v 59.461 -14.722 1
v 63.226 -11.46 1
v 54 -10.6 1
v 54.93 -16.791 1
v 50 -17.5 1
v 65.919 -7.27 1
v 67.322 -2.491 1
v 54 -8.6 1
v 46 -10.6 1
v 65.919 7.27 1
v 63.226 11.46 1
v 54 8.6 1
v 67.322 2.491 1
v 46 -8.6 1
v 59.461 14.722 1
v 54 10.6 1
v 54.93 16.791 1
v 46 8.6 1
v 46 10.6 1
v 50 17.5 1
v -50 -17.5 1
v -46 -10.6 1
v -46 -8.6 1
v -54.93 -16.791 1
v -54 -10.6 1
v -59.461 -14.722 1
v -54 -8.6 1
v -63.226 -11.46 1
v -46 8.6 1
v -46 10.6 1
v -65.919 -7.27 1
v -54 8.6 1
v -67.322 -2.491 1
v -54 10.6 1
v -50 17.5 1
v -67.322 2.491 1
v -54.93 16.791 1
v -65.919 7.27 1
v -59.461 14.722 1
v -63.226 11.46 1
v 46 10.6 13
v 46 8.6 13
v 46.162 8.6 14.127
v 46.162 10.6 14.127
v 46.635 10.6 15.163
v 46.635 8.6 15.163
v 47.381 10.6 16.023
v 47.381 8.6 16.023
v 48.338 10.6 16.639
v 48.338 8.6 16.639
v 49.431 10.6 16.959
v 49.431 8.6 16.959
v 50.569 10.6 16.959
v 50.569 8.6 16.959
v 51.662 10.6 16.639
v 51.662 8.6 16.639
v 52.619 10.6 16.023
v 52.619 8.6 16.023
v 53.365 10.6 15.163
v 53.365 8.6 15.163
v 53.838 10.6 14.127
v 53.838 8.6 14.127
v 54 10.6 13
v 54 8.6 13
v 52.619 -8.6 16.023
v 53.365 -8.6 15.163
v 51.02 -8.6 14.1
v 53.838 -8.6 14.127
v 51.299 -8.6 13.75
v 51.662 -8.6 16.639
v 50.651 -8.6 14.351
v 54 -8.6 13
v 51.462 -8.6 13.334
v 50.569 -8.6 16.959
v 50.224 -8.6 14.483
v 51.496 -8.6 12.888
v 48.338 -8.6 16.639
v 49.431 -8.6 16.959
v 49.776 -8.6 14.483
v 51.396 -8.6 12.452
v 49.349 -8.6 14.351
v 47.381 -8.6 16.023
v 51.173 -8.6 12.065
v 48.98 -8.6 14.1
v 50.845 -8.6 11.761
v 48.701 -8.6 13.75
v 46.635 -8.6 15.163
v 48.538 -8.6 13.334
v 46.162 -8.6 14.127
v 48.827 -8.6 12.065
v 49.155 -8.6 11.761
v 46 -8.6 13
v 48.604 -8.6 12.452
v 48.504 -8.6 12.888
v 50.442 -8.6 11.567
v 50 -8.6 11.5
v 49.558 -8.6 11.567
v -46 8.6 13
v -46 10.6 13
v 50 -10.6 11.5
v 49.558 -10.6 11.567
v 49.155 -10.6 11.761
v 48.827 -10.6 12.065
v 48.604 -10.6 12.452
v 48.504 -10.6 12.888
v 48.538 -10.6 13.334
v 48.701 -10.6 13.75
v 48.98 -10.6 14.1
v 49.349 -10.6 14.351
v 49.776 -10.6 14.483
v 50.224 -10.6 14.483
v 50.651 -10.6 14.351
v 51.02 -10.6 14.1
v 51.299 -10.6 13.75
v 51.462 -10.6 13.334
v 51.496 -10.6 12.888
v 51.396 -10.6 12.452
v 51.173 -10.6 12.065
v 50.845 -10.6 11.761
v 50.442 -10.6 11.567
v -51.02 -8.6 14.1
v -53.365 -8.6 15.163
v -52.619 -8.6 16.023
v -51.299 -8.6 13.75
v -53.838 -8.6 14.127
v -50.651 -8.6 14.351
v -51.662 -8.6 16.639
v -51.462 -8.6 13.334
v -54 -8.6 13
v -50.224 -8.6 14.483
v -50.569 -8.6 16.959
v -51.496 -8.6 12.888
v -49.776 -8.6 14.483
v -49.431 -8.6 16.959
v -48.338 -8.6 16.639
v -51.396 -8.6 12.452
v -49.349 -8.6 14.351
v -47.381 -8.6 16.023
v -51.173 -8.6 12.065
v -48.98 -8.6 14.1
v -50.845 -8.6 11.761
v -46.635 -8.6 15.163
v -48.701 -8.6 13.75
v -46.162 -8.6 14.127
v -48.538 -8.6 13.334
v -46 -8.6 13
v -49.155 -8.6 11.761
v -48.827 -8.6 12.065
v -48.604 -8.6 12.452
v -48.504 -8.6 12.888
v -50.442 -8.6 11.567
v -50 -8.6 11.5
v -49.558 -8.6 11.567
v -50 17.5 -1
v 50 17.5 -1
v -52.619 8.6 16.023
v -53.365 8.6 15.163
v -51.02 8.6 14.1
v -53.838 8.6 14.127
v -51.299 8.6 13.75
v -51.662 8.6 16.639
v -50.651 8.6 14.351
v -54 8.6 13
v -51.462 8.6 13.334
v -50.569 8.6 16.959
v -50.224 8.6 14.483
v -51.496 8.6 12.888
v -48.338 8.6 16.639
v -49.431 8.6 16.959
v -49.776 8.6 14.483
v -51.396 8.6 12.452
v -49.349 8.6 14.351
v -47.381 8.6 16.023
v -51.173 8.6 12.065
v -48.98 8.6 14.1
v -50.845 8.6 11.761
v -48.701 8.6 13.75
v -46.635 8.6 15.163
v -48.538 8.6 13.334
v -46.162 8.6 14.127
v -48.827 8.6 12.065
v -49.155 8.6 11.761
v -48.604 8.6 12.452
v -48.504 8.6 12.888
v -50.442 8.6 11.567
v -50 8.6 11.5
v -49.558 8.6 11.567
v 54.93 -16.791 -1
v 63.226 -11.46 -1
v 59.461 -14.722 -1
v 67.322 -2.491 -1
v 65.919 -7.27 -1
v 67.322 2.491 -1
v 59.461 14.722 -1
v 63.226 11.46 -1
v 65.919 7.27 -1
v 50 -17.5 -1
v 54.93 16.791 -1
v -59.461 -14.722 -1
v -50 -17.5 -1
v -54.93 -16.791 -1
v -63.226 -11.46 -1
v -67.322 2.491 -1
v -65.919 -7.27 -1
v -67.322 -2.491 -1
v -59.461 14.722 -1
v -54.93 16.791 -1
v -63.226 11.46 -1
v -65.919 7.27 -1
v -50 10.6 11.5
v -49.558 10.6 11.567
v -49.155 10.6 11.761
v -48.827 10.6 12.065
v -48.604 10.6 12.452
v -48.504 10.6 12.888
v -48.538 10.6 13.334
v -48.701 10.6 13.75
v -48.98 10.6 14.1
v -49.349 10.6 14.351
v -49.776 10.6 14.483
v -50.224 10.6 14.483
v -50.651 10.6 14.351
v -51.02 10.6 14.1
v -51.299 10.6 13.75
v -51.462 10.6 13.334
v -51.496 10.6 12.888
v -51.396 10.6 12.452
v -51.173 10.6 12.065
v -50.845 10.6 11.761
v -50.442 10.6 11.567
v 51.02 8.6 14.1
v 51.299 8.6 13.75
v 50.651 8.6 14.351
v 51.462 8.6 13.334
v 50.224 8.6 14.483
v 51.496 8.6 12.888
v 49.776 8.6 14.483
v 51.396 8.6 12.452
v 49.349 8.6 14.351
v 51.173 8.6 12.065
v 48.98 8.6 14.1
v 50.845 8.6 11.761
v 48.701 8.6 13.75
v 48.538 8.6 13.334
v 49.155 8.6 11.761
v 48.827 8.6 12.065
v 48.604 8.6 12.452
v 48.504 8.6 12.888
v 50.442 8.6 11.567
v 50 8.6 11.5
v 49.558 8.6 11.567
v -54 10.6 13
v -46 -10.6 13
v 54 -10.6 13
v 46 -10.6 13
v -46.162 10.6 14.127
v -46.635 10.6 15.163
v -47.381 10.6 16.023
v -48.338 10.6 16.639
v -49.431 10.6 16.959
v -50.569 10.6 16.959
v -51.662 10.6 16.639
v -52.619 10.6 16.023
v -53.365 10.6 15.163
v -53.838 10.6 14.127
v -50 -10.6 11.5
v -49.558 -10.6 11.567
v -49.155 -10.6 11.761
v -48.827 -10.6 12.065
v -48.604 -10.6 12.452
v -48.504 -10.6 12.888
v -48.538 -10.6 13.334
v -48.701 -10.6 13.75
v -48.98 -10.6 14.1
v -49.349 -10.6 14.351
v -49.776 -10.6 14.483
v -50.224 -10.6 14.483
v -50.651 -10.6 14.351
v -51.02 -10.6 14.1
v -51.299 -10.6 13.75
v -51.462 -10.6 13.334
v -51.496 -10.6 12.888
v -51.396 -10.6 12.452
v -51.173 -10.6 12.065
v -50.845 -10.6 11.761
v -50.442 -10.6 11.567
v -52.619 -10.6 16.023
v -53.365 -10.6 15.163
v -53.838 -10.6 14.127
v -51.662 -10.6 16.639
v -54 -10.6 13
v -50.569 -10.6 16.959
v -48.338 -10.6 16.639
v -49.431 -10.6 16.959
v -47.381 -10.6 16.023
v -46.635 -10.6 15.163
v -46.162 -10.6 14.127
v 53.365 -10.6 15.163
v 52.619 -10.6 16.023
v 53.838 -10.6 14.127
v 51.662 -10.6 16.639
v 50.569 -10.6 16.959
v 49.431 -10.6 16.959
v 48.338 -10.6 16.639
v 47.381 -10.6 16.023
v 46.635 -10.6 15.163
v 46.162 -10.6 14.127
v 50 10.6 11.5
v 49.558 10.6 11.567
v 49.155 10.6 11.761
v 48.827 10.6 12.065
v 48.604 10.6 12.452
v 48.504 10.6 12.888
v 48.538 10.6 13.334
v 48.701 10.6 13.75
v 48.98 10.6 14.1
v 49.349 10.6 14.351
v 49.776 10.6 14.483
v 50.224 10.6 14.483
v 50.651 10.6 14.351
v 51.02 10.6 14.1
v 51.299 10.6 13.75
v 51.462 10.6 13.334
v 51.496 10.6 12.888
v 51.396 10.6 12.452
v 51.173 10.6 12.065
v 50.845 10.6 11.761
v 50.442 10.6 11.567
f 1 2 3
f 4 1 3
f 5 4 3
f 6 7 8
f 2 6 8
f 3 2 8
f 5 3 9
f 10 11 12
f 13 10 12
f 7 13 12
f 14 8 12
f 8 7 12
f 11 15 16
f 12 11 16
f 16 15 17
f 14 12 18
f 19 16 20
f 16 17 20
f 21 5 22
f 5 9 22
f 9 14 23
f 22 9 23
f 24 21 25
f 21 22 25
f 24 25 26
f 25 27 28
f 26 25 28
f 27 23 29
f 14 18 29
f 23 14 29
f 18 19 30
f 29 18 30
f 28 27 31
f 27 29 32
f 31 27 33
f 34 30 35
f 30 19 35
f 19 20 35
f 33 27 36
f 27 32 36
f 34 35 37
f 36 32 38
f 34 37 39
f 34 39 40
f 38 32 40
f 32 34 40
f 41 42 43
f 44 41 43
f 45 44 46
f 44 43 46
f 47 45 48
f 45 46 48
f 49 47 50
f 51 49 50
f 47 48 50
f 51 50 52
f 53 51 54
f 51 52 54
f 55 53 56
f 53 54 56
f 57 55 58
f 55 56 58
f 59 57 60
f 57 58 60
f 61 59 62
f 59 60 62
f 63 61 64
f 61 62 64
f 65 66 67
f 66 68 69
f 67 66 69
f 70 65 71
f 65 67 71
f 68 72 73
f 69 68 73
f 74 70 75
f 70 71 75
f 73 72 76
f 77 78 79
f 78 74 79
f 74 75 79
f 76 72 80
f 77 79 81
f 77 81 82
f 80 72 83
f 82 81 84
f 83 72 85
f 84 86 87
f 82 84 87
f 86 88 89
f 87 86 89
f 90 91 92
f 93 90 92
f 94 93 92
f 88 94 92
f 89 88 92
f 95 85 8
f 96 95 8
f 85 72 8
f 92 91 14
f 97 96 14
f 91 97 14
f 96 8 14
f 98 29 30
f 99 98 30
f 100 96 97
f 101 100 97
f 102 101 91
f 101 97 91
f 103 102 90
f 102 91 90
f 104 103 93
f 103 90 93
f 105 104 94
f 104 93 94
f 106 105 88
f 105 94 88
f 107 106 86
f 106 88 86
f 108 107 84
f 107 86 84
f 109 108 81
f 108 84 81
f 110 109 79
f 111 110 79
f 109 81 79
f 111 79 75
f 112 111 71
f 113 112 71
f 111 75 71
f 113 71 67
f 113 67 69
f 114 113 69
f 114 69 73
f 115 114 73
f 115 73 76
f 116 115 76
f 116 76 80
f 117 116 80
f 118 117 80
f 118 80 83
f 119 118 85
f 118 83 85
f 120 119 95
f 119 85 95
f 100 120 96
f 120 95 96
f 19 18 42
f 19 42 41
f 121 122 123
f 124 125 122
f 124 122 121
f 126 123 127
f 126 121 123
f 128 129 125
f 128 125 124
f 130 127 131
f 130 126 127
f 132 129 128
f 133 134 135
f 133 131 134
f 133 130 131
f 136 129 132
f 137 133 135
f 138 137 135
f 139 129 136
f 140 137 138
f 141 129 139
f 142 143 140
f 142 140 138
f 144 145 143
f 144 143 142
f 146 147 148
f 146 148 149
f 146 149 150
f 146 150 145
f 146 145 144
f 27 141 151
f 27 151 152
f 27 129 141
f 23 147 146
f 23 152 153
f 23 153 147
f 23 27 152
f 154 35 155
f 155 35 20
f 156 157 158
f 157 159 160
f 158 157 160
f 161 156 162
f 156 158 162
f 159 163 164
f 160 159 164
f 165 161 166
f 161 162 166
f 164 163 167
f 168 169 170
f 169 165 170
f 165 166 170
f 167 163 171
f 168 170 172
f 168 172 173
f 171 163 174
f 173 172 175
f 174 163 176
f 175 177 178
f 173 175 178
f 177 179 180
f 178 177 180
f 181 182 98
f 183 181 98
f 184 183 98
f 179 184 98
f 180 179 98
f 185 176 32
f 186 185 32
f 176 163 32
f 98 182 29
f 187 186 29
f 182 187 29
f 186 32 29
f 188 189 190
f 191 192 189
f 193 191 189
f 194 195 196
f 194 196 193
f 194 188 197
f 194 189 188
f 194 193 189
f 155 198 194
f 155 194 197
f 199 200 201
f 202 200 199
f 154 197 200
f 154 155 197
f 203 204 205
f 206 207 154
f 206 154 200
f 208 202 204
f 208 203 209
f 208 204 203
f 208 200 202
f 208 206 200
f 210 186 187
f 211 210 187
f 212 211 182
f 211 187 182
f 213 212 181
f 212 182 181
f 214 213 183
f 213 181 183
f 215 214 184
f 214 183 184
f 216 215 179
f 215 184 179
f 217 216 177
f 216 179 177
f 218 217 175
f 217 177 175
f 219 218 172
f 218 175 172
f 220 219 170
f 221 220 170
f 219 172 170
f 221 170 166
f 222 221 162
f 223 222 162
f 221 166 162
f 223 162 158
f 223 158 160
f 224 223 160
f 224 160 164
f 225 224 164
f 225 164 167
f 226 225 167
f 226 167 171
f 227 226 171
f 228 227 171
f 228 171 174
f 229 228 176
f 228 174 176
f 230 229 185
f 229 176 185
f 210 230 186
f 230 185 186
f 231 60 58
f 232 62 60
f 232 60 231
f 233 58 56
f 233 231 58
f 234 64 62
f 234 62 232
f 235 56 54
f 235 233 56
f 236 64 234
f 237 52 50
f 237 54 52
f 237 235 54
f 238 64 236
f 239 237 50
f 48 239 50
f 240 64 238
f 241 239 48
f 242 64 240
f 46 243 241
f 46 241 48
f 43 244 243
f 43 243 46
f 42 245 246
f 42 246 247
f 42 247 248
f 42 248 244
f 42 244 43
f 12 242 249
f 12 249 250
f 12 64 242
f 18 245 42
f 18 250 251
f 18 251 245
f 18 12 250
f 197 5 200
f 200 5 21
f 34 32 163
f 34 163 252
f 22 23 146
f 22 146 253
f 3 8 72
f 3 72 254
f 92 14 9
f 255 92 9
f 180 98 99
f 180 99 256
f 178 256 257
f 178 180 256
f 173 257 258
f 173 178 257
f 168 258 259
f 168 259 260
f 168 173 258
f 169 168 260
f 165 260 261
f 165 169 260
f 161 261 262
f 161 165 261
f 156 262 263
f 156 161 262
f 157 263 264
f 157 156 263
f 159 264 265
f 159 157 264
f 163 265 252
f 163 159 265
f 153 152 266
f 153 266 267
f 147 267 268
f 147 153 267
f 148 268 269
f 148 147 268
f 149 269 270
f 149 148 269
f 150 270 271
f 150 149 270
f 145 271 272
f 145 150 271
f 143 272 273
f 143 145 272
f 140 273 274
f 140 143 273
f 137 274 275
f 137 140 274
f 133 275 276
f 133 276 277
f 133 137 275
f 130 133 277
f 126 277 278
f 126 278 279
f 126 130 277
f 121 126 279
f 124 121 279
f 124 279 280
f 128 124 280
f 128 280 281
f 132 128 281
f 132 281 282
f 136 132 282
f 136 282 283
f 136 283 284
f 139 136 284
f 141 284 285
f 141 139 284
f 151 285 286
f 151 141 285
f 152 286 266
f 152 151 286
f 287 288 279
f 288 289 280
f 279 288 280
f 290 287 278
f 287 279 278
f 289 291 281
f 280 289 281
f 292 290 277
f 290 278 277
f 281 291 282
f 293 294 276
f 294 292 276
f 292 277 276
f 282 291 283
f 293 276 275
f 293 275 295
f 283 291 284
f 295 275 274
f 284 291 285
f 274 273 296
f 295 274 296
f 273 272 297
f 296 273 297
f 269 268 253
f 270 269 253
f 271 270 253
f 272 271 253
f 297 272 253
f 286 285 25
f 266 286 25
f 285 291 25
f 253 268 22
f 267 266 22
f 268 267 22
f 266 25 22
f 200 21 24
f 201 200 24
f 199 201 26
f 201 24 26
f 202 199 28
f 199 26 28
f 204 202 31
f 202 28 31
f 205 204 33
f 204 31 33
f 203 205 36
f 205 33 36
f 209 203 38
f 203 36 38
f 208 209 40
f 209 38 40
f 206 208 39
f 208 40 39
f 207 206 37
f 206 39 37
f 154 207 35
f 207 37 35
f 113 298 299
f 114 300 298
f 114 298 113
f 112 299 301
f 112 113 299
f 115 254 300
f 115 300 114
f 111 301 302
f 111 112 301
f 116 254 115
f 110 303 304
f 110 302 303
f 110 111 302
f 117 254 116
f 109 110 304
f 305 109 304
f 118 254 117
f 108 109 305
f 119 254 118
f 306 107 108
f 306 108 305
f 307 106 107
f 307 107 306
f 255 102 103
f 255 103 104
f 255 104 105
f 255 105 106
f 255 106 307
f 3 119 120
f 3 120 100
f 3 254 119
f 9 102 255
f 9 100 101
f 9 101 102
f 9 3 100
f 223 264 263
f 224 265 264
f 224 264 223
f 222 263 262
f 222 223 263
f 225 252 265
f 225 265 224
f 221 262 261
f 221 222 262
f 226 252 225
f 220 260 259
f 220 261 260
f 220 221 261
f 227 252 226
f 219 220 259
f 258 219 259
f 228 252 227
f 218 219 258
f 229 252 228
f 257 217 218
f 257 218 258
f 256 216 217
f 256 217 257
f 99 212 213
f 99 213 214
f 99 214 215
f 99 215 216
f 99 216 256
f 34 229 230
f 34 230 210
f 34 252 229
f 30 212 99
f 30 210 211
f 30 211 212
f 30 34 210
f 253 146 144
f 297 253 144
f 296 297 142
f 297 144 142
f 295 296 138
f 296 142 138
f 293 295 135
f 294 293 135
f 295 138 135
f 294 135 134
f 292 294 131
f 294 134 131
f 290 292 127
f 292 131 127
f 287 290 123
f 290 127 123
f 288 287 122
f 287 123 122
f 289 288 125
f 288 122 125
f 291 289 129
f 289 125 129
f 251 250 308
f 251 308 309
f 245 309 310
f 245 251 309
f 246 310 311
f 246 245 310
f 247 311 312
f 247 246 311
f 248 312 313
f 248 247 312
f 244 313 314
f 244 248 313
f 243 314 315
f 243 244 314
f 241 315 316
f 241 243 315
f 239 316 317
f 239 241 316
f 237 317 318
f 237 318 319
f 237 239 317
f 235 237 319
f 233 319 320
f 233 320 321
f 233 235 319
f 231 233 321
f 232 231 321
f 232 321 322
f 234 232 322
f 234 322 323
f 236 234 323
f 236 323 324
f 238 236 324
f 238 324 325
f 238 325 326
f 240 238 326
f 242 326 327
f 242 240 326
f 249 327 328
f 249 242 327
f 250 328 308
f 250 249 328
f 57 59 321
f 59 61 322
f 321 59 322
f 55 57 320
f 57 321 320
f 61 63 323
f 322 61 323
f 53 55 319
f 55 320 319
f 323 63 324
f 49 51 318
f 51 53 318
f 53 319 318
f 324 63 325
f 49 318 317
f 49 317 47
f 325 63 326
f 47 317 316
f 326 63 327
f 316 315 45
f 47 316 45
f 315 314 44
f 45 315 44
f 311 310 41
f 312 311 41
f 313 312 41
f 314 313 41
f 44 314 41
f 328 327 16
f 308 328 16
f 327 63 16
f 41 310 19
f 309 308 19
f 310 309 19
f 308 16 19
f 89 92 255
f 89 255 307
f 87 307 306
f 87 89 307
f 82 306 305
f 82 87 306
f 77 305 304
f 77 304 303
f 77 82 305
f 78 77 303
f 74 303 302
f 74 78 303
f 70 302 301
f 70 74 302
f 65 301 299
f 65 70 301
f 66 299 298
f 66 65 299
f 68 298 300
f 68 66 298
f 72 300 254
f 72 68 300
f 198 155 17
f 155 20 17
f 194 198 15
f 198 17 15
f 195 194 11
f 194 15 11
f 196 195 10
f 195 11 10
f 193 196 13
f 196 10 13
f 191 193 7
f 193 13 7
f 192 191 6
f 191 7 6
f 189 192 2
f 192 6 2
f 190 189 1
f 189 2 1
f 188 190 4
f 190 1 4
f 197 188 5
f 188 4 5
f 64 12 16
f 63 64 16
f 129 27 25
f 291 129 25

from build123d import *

# Parameters (mm, degrees)
BOSS_EXTRUDE3_DEPTH     = 1
SKETCH2_W               = 8
SKETCH2_H               = 2
BOSS_EXTRUDE4_DEPTH     = 20
SKETCH5_R               = 1.5
CUT_EXTRUDE1_DEPTH      = 2
MIRROR2_COPY_1_SKETCH_W = 8
MIRROR2_COPY_1_SKETCH_H = 2
MIRROR2_COPY_1_DEPTH    = 20
MIRROR2_COPY_2_SKETCH_R = 1.5
MIRROR2_COPY_2_DEPTH    = 2


with BuildPart() as part:
    # Sketch1 → Boss-Extrude3 (new, symmetric)
    with BuildSketch(Plane.XY):
        with BuildLine():
            Line((-50, 17.5), (50, 17.5))
            ThreePointArc((50, 17.5), (67.5, 0), (50, -17.5))
            Line((50, -17.5), (-50, -17.5))
            ThreePointArc((-50, -17.5), (-67.5, 0), (-50, 17.5))
        make_face()
    extrude(amount=BOSS_EXTRUDE3_DEPTH, both=True)

    # Sketch2 → Boss-Extrude4 (add)
    with BuildSketch(Plane.XY.offset(1)):
        with Locations((-50, 9.6)):
            Rectangle(SKETCH2_W, SKETCH2_H)
    boss_extrude4 = extrude(amount=BOSS_EXTRUDE4_DEPTH)

    # Sketch5 → Cut-Extrude1 (cut)
    with BuildSketch(Plane.XZ.offset(-8.6)):
        with Locations(Location((-50, 13, 0), (0, 0, 270))):
            Circle(SKETCH5_R)
        with BuildLine():
            Line((-54, 13), (-54, 21))
            Line((-54, 21), (-46, 21))
            Line((-46, 21), (-46, 13))
            ThreePointArc((-46, 13), (-50, 17), (-54, 13))
        make_face()
    cut_extrude1 = extrude(amount=-CUT_EXTRUDE1_DEPTH, mode=Mode.SUBTRACT)

    # Mirror1: Boss-Extrude4, Cut-Extrude1 across plane
    add(boss_extrude4.mirror(Plane.ZX))
    add(cut_extrude1.mirror(Plane.ZX), mode=Mode.SUBTRACT)

    # Mirror2: Boss-Extrude4, Cut-Extrude1 across plane
    add(boss_extrude4.mirror(Plane(origin=(0, 0, 0), x_dir=(0, 0, 1), z_dir=(1, 0, 0))))
    add(cut_extrude1.mirror(Plane(origin=(0, 0, 0), x_dir=(0, 0, 1), z_dir=(1, 0, 0))), mode=Mode.SUBTRACT)

    # Mirror2 copy 1 sketch → Mirror2 copy 1 (add)
    with BuildSketch(Plane(origin=(0, 0, 1), x_dir=(-1, 0, 0), z_dir=(0, 0, 1))):
        with Locations((-50, 9.6)):
            Rectangle(MIRROR2_COPY_1_SKETCH_W, MIRROR2_COPY_1_SKETCH_H)
    extrude(amount=MIRROR2_COPY_1_DEPTH)

    # Mirror2 copy 2 sketch → Mirror2 copy 2 (cut)
    with BuildSketch(Plane(origin=(0, -8.6, 0), x_dir=(-1, 0, 0), z_dir=(0, 1, 0))):
        with Locations(Location((-50, 13, 0), (0, 0, 270))):
            Circle(MIRROR2_COPY_2_SKETCH_R)
        with BuildLine():
            Line((-54, 13), (-54, 21))
            Line((-54, 21), (-46, 21))
            Line((-46, 21), (-46, 13))
            ThreePointArc((-46, 13), (-50, 17), (-54, 13))
        make_face()
    extrude(amount=-MIRROR2_COPY_2_DEPTH, mode=Mode.SUBTRACT)


solid = part.part
